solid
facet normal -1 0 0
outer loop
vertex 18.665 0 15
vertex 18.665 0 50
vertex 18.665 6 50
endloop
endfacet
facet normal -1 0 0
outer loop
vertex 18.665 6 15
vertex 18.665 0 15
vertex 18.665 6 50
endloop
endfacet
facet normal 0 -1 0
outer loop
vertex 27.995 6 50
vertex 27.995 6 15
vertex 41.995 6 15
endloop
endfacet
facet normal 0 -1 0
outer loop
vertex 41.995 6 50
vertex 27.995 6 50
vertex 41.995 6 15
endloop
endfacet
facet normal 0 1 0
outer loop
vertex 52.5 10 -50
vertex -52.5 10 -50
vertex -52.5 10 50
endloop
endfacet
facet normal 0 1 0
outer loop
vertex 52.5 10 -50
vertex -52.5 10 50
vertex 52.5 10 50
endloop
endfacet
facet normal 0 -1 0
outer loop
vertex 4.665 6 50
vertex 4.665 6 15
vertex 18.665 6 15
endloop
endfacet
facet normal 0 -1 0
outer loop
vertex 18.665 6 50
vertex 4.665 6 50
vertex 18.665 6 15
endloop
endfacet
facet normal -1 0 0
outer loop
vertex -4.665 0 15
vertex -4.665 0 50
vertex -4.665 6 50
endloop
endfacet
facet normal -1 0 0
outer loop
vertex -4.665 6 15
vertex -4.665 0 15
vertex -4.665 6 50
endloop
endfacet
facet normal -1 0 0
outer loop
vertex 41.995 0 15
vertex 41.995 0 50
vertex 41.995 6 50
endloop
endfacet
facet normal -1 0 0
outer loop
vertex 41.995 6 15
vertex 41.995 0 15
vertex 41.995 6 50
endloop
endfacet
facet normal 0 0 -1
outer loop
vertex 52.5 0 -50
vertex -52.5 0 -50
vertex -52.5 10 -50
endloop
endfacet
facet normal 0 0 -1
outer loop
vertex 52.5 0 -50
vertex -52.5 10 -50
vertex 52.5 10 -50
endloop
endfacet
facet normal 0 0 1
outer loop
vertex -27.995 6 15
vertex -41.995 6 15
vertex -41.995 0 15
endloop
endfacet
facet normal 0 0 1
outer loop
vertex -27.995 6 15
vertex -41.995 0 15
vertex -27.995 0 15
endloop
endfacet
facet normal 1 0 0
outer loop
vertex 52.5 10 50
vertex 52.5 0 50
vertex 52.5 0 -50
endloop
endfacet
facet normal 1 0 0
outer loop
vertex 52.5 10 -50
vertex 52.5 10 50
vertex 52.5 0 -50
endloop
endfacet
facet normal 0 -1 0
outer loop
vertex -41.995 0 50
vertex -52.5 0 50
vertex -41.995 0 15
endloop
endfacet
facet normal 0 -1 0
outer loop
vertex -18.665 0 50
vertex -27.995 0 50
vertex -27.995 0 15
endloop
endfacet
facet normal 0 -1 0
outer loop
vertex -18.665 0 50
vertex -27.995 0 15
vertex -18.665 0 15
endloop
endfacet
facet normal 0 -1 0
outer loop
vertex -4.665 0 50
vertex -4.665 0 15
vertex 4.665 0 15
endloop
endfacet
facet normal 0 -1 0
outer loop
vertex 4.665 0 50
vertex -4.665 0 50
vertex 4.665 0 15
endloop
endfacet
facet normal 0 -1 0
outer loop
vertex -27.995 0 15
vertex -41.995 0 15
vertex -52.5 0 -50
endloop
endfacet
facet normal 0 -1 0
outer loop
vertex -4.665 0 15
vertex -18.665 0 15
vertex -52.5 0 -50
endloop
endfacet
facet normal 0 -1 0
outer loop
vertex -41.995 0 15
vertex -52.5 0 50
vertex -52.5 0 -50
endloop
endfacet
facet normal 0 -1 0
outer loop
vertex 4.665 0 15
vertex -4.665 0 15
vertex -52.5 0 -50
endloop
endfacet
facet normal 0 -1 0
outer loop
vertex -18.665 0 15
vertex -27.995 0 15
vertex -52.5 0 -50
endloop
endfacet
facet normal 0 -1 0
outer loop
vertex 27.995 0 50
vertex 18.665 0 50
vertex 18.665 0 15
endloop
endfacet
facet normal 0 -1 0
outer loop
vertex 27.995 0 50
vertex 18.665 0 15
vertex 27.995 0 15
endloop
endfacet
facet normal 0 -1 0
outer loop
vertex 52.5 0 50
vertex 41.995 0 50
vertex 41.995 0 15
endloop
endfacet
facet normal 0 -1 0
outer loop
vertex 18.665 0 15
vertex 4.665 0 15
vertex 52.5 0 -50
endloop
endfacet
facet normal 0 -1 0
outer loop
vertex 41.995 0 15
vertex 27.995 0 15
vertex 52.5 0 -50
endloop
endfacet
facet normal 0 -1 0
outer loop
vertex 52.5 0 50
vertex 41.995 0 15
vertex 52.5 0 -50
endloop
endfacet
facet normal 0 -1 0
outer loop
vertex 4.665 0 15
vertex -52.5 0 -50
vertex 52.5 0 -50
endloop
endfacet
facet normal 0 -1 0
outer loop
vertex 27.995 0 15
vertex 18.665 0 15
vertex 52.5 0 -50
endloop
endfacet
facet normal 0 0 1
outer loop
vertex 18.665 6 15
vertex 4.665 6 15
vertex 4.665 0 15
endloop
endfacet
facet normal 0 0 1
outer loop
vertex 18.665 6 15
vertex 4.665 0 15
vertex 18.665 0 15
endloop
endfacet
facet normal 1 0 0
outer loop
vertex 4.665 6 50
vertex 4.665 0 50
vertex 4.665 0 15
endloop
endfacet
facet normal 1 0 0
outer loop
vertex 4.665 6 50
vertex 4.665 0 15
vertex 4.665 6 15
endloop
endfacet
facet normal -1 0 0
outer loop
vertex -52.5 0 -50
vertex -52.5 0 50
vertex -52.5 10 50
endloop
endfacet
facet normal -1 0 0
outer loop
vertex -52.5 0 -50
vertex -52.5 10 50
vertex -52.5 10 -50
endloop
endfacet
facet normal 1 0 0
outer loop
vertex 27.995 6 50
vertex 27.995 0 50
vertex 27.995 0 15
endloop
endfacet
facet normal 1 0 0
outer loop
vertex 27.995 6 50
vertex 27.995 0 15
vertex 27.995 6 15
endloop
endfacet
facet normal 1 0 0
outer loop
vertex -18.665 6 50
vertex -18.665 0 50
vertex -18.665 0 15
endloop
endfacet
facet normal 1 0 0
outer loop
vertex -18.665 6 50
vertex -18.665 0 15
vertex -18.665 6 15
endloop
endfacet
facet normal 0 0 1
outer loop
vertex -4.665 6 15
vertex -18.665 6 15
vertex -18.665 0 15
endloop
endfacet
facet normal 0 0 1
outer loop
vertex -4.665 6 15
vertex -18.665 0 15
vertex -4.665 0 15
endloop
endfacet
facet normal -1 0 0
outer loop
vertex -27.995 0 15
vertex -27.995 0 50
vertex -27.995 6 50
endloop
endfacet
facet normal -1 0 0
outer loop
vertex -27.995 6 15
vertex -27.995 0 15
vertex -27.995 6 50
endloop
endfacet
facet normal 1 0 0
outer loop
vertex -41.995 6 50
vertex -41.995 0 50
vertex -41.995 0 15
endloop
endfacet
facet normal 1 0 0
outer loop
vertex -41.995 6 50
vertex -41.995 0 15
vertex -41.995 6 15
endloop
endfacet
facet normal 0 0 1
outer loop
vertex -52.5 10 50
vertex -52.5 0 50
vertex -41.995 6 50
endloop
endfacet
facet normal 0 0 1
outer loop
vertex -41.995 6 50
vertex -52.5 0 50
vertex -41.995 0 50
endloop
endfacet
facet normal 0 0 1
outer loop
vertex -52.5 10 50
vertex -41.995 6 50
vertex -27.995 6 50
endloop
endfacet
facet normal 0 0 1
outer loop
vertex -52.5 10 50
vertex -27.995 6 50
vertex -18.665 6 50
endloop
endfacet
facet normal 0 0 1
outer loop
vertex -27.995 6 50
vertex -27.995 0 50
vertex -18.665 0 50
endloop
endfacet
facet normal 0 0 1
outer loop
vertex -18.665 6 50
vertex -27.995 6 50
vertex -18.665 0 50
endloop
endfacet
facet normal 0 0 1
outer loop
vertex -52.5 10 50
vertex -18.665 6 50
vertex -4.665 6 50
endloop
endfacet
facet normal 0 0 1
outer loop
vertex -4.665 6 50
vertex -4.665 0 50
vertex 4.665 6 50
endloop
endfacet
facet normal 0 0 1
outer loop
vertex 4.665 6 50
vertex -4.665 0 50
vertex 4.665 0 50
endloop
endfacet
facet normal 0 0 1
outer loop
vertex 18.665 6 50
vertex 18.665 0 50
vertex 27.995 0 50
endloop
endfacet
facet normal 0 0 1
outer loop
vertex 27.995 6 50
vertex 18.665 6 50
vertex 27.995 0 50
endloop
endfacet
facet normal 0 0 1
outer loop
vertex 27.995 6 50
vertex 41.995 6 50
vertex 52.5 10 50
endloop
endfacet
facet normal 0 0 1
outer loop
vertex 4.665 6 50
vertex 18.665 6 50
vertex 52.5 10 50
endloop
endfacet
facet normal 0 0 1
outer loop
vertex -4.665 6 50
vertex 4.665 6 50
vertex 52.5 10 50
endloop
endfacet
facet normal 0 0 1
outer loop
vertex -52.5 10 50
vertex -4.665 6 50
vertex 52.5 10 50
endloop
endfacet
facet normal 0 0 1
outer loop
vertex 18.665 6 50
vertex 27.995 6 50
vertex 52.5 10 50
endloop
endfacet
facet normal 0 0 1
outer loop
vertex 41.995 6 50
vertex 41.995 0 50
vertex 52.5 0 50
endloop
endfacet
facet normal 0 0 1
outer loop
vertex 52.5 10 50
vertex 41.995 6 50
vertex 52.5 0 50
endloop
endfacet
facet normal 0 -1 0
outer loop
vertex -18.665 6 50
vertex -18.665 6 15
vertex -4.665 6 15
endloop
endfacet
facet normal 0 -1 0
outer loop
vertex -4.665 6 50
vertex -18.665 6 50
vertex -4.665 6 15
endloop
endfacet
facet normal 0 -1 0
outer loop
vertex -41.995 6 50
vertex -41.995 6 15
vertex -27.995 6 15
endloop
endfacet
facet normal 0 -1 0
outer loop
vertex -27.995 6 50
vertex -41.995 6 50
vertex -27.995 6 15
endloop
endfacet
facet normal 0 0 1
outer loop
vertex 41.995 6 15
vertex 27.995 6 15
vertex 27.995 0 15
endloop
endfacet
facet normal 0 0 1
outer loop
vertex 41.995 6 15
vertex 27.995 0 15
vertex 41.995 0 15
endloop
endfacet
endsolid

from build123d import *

# Parameters (mm, degrees)
SKETCH1_W           = 105
SKETCH1_H           = 100
BOSS_EXTRUDE1_DEPTH = 10
SKETCH2_W           = 14
SKETCH2_H           = 6
CUT_EXTRUDE1_DEPTH  = 35


with BuildPart() as part:
    # Sketch1 → Boss-Extrude1 (new body)
    with BuildSketch(Plane(origin=(0, 0, 0), x_dir=(1, 0, 0), z_dir=(0, 1, 0))):
        Rectangle(SKETCH1_W, SKETCH1_H)
    extrude(amount=BOSS_EXTRUDE1_DEPTH)

    # Sketch2 → Cut-Extrude1 (cut)
    with BuildSketch(Plane.XY.offset(50)):
        with Locations((-34.995, 3)):
            Rectangle(SKETCH2_W, SKETCH2_H)
        with Locations((-11.665, 3)):
            Rectangle(SKETCH2_W, SKETCH2_H)
        with Locations((34.995, 3)):
            Rectangle(SKETCH2_W, SKETCH2_H)
        with Locations((11.665, 3)):
            Rectangle(SKETCH2_W, SKETCH2_H)
    extrude(amount=-CUT_EXTRUDE1_DEPTH, mode=Mode.SUBTRACT)


solid = part.part
